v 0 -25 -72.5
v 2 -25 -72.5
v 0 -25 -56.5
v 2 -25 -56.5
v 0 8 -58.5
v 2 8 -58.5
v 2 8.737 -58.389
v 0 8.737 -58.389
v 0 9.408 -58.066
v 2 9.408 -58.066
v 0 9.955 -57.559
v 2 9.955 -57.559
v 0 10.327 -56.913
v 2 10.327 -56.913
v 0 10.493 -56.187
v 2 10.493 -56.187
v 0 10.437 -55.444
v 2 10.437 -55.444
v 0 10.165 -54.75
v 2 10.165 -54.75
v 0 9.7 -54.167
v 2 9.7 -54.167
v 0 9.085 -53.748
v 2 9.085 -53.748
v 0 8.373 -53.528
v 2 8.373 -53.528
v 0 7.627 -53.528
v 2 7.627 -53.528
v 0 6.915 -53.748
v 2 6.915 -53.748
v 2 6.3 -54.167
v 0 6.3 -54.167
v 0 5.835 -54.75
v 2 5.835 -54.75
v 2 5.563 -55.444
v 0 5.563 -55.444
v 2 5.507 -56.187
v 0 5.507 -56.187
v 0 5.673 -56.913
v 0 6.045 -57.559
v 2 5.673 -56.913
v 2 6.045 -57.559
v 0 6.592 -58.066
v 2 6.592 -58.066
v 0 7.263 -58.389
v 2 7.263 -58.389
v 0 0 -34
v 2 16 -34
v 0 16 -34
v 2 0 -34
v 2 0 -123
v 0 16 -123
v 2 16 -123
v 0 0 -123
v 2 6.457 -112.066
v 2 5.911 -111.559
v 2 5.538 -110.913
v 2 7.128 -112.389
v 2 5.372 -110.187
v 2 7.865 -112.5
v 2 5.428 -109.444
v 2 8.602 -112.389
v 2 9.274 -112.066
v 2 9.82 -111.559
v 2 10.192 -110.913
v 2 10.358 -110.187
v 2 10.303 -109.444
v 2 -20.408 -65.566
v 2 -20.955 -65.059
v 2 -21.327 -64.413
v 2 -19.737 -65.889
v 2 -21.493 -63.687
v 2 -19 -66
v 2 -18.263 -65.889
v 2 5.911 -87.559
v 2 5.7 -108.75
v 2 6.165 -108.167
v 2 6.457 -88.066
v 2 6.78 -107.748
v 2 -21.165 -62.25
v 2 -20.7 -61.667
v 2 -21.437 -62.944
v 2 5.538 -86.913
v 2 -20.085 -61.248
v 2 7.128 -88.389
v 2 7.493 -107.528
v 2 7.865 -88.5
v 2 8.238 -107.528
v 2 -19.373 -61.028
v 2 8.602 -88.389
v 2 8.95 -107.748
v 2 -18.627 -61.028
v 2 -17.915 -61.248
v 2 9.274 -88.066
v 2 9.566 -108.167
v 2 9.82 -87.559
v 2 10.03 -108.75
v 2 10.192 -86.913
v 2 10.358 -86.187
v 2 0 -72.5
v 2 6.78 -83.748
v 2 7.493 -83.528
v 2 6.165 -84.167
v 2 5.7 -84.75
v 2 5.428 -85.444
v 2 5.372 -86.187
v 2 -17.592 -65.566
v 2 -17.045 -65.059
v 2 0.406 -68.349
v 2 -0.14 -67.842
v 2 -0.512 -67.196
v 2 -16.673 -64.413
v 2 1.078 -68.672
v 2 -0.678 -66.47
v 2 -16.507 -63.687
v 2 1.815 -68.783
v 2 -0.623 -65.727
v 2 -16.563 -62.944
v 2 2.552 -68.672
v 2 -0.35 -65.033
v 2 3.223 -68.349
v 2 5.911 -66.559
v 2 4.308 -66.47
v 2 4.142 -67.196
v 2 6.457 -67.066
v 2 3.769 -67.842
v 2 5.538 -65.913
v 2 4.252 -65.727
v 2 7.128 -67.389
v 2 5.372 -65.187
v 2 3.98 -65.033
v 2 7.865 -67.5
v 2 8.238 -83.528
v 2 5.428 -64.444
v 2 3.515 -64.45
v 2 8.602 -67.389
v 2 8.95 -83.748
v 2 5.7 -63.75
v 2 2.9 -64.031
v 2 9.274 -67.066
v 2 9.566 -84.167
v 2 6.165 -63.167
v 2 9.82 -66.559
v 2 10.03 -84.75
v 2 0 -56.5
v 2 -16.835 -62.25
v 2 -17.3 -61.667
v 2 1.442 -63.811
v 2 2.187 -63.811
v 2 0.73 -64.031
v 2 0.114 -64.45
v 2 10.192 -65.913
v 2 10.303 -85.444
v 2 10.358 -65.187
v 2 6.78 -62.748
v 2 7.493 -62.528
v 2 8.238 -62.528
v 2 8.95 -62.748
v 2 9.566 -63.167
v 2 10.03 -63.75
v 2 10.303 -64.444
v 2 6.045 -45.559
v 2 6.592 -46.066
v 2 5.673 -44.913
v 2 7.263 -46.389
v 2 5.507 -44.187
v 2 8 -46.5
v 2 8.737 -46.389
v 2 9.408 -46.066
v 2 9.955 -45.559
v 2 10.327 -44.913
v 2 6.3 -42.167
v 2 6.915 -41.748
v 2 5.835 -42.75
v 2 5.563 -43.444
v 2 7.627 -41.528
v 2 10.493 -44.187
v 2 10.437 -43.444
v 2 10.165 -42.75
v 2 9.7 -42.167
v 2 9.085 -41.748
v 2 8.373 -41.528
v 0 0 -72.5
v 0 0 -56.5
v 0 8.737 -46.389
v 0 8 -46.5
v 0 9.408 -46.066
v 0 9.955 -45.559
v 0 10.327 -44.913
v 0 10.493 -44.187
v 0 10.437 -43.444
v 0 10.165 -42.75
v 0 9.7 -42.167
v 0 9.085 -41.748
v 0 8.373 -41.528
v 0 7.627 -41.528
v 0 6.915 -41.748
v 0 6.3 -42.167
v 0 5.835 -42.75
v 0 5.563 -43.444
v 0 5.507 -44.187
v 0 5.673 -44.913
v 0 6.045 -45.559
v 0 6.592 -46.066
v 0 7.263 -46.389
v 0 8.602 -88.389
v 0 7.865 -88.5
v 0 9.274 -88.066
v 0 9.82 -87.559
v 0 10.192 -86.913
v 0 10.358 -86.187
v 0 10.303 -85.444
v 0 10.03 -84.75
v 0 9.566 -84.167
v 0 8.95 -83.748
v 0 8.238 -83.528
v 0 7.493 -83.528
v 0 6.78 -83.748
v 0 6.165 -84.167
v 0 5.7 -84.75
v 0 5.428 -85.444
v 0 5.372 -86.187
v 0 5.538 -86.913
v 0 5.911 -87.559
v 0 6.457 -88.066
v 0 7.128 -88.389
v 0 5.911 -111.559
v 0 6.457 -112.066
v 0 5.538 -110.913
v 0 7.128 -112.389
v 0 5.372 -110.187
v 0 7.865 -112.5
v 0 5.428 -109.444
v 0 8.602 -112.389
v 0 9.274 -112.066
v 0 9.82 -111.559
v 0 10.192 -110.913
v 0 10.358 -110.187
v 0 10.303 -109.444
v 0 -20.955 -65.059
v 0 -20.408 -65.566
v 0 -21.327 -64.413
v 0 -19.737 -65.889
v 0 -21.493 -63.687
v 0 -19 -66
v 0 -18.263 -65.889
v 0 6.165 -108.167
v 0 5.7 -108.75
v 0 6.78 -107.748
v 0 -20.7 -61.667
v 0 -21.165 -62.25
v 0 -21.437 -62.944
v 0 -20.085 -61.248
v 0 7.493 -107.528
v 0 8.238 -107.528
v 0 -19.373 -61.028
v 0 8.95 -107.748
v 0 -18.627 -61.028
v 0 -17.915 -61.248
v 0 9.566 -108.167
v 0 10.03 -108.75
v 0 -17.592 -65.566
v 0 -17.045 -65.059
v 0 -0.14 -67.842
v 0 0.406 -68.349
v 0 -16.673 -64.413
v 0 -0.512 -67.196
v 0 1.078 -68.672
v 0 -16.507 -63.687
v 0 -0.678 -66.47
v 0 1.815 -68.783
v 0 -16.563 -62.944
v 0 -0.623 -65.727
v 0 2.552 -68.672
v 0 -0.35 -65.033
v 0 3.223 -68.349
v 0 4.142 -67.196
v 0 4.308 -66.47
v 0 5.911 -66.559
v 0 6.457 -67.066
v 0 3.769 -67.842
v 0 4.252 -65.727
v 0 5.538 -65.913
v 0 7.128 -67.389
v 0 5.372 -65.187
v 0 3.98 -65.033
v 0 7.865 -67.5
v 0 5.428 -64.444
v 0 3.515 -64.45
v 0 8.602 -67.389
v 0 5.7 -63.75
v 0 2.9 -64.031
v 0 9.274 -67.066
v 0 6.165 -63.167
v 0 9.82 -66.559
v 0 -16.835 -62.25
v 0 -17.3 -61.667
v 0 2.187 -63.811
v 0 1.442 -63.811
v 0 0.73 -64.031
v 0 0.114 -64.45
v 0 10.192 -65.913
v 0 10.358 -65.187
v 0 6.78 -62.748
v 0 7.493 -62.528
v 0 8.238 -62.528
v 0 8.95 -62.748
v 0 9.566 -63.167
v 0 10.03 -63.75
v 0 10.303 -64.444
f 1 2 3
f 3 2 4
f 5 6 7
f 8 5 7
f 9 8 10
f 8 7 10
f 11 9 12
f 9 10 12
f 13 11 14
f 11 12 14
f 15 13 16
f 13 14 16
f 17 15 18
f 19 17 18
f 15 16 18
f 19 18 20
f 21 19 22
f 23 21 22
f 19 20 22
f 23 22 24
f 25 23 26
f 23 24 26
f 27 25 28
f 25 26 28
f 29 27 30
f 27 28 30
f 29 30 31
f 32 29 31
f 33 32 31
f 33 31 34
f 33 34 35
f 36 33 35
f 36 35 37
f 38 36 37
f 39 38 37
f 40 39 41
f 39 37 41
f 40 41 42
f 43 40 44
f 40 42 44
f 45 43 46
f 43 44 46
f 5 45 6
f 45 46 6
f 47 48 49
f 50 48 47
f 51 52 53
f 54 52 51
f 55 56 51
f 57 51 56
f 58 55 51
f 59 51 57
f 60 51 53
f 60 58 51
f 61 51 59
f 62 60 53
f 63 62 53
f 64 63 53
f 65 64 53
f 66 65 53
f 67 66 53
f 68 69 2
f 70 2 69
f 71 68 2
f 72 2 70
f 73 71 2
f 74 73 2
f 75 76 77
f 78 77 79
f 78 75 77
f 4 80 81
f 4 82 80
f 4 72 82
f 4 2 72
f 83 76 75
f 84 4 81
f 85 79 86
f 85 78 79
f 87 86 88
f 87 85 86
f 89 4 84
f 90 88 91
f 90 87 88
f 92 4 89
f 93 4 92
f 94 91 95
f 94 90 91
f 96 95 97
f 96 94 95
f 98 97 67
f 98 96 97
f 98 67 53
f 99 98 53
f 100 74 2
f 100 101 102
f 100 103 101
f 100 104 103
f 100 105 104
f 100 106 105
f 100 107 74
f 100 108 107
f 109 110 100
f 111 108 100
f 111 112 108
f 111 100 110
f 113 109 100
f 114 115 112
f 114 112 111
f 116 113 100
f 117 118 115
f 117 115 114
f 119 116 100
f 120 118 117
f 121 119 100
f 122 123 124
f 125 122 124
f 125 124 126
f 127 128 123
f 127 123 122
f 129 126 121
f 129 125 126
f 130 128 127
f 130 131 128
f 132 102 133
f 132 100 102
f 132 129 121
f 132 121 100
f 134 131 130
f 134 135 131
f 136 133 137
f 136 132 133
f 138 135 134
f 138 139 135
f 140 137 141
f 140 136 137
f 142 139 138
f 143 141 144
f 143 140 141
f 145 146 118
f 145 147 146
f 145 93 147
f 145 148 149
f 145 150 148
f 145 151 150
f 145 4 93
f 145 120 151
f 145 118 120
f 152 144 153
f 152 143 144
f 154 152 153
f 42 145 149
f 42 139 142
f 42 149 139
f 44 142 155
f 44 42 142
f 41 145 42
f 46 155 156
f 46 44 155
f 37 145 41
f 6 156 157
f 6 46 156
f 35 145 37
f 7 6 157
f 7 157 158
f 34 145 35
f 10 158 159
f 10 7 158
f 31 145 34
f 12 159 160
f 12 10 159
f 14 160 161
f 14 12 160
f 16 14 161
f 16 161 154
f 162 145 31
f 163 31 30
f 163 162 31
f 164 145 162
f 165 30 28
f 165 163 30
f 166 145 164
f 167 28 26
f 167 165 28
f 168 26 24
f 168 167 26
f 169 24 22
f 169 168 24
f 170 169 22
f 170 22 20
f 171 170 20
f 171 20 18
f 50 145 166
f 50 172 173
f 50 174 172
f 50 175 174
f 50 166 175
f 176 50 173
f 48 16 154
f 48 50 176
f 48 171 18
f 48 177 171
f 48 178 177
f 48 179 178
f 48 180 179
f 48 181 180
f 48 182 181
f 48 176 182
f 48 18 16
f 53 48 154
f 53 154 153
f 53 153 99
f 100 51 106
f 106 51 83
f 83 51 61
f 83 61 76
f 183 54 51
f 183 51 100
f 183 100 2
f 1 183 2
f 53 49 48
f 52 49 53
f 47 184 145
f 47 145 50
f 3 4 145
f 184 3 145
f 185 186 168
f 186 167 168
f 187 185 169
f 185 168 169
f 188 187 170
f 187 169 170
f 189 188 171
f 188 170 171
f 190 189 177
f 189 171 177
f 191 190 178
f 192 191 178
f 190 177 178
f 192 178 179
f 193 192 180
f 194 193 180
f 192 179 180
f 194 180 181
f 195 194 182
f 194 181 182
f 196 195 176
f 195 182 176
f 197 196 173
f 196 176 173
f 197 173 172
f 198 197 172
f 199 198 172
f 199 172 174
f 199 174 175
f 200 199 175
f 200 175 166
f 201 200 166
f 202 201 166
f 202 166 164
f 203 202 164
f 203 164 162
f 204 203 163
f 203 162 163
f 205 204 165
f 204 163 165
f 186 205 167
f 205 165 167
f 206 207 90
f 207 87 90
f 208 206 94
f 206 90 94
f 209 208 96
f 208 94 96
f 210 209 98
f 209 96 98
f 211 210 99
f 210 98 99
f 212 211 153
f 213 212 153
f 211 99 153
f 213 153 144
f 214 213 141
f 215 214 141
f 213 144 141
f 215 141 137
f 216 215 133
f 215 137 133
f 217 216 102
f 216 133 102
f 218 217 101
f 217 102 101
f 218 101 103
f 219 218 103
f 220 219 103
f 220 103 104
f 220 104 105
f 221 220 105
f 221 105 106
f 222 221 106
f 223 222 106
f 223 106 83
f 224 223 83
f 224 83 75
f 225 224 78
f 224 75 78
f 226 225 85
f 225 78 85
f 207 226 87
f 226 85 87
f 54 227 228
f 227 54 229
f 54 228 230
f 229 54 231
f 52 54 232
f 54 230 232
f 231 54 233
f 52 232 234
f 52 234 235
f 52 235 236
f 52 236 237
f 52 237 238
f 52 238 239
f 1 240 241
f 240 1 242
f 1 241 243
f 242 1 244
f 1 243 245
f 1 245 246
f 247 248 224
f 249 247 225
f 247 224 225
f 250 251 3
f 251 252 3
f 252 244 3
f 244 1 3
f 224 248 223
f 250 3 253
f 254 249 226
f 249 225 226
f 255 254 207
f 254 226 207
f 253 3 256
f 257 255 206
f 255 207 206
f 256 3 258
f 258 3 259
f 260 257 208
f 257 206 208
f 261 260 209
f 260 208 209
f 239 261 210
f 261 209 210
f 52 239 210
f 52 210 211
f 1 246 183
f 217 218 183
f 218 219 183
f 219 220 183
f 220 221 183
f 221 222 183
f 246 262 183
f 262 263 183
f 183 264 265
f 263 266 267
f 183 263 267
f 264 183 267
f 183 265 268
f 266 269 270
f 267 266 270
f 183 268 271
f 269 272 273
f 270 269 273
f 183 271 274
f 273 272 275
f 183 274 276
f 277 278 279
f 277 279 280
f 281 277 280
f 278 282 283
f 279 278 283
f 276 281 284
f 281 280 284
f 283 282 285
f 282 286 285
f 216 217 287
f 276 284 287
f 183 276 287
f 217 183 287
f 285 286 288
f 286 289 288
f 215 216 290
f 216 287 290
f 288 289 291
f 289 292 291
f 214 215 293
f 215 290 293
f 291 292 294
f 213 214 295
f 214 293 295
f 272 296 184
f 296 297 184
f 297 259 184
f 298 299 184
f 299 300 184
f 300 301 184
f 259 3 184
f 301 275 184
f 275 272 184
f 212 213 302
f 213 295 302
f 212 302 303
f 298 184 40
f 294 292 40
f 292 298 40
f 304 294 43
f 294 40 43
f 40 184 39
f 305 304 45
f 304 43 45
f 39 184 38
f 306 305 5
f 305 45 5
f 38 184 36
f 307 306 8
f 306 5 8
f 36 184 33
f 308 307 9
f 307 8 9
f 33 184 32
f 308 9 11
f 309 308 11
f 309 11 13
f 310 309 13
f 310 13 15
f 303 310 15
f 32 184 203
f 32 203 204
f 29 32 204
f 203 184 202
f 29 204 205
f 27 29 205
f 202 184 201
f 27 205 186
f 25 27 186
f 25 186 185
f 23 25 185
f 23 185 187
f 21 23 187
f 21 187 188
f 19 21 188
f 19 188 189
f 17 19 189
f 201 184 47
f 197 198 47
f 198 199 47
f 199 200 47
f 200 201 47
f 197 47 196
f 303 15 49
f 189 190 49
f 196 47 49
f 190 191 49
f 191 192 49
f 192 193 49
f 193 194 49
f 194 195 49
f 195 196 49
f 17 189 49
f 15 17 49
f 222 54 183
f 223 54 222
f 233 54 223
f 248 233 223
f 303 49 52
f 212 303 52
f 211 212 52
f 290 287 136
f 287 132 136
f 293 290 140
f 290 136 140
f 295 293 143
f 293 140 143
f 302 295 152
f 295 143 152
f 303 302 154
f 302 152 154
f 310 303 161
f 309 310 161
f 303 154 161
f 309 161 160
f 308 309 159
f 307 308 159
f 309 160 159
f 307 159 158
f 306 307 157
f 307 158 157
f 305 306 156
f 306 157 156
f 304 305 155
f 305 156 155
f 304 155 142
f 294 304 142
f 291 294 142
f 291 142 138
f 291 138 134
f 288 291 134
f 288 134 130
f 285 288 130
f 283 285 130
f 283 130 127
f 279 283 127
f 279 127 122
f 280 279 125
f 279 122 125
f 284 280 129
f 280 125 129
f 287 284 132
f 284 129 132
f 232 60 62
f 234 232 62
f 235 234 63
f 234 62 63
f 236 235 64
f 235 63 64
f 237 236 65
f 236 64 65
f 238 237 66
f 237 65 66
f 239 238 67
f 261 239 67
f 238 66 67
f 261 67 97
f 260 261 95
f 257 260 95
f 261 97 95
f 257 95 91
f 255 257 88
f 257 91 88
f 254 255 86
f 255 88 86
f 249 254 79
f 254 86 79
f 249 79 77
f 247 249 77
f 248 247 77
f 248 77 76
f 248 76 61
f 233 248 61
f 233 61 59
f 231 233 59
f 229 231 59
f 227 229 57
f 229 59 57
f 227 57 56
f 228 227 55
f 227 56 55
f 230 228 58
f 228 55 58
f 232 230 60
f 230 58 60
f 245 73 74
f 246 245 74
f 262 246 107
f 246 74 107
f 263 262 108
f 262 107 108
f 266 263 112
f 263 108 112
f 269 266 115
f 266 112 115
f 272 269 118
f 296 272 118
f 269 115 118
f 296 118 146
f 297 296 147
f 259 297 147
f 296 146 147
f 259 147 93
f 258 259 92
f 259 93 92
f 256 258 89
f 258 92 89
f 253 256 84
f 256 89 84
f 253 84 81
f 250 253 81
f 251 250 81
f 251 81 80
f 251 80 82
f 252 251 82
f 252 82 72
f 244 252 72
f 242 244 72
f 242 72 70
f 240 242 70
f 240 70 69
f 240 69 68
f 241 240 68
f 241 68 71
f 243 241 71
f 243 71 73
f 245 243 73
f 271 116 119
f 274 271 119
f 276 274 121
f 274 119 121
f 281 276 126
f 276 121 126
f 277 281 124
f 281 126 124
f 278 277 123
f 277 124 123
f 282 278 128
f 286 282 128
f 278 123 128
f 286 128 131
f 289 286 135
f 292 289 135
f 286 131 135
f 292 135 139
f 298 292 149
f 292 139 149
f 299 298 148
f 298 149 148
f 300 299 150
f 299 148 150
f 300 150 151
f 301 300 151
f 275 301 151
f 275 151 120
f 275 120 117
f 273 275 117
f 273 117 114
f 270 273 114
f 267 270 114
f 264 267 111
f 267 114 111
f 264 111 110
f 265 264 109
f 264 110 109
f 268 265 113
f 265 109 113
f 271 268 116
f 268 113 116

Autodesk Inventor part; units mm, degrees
ref_plane "YZ Plane" through (0, 0, 0) normal (1, 0, 0) x (0, 1, 0)
ref_plane "XZ Plane" through (0, 0, 0) normal (0, 1, 0) x (-1, 0, 0)
ref_plane "XY Plane" through (0, 0, 0) normal (0, 0, 1) x (1, 0, 0)
sketch "Sketch1" plane through (0, 0, 0) normal (1, 0, 0) x (0, 1, 0)
  line L0 (0, 0) -> (16, 0)
  line L1 (16, 0) -> (16, -100)
  line L2 (16, -100) -> (0, -100)
  line L3 (0, -10) -> (0, -10)
  line L4 (0, -10) -> (0, -25)
  line L5 (0, -25) -> (0, -25)
  line L6 (0, -90) -> (0, -90)
  line L7 (0, -90) -> (0, -75)
  line L8 (0, -75) -> (0, -75)
  line L9 (0, -10) -> (0, 0)
  line L10 (0, -100) -> (0, -90)
  line L11 (0, -75) -> (0, -25)
  dimension "d0" = 16
  dimension "d1" = 100
  dimension "d2" = 0
  dimension "d3" = 15
  dimension "d4" = 10
  dimension "d5" = 15
  dimension "d6" = 10
  dimension "d10" = 0
  dimension "d11" = 0
  dimension "d12" = 0
extrude "Extrusion1" add sketch "Sketch1" along normal blind 2
sketch "Sketch5" plane through (2, 0, 0) normal (1, 0, 0) x (0, 0, -1)
  line L0 (0, 0) -> (100, 0) projected
  circle A0 centre (63.5, -19) radius 2.5 projected
  line L1 (56.5, 0) -> (72.5, 0)
  line L2 (72.5, 0) -> (72.5, -25)
  line L3 (72.5, -25) -> (56.5, -25)
  line L4 (56.5, -25) -> (56.5, 0)
  circle A1 centre (66.2831, 1.8148) radius 2.5
  circle A2 centre (56, 8) radius 6 construction
  circle A3 centre (63.5, -19) radius 15 construction
  circle A4 centre (66.2831, 1.8148) radius 6 construction
  dimension "d44" = 16
  dimension "d45" = 25
  dimension "d46" = 9
  dimension "d52" = 5
  dimension "d56" = 12
  dimension "d57" = 30
  dimension "d58" = 12
extrude "Extrusion6" add sketch "Sketch5" against normal blind 2 contours L0 A1 L2 L3 L4 | L0 A1 picked at (65.8534, -0.1091)
sketch "Sketch7" plane through (2, 0, 0) normal (1, 0, 0) x (0, 0, -1)
  circle A0 centre (44, 8) radius 2.5 projected
  circle A1 centre (56, 8) radius 2.5 projected
  circle A2 centre (66.2831, 1.8148) radius 2.5 projected
  circle A3 centre (63.5, -19) radius 2.5 projected
  circle A4 centre (44, 8) radius 2.5
  circle A5 centre (56, 8) radius 2.5
  circle A6 centre (66.2831, 1.8148) radius 2.5
  circle A7 centre (63.5, -19) radius 2.5 projected
  circle A8 centre (63.5, -19) radius 2.5
  point P0 (0, 0)
  dimension "d59" = 5
  dimension "d60" = 5
  dimension "d61" = 5
  dimension "d62" = 5
extrude "Extrusion8" cut sketch "Sketch7" against normal blind 10 contours A0 | A1 | A2
sketch "Sketch8" plane through (2, 0, 0) normal (1, 0, 0) x (0, 0, -1)
  circle A0 centre (44, 8) radius 2.5 projected
  line L0 (0, 0) -> (56.5, 0) projected
  line L1 (0, 16) -> (0, 0) projected
  line L2 (100, 16) -> (0, 16) projected
  line L3 (56.5, 0) -> (0, 0) projected
  line L4 (34, 0) -> (0, 0)
  line L5 (0, 0) -> (0, 16)
  line L6 (0, 16) -> (34, 16)
  line L7 (34, 16) -> (34, 0)
  dimension "d65" = 10
extrude "Extrusion9" cut sketch "Sketch8" against normal blind 10 contours L1 L2 L7 L0
sketch "Sketch9" plane through (2, 0, 0) normal (1, 0, 0) x (0, 0, -1)
  circle A0 centre (56, 8) radius 2.5 projected
  circle A1 centre (66.2831, 1.8148) radius 2.5 projected
  circle A2 centre (65, 7.8652) radius 2.5
  circle A3 centre (86, 7.8652) radius 2.5
  circle A4 centre (44, 8) radius 2.5 projected
  point P0 (0, 0)
  dimension "d68" = 5
  dimension "d71" = 5
  dimension "d72" = 21
  dimension "d76" = 21
  dimension "d77" = 6.0505
  dimension "d78" = 6.0505
extrude "Extrusion10" cut sketch "Sketch9" against normal blind 10 contours A2 | A3
sketch "Sketch10" plane through (0, 0, 0) normal (-1, 0, 0) x (0, 0, 1)
  line L0 (-123.9658, 20.3206) -> (-103.1897, 17.2622) projected
  line L1 (-124.0249, -0.6793) -> (-123.9658, 20.3206) projected
  line L2 (-102.025, -0.7412) -> (-124.0249, -0.6793) projected
  line L3 (-102.025, -0.7412) -> (-101.9743, 17.2588) projected
  line L4 (-103.1897, 17.2622) -> (-101.9743, 17.2588) projected
  circle A0 centre (-65, 7.8652) radius 2.5 projected
  circle A1 centre (-86, 7.8652) radius 2.5 projected
  line L5 (-34, 0) -> (-34, 16) projected
  line L6 (-34, 16) -> (-100, 16) projected
  line L7 (-100, 16) -> (-100, 0) projected
  line L8 (-100, 0) -> (-72.5, 0) projected
  line L9 (-72.5, 0) -> (-72.5, -25) projected
  line L10 (-72.5, -25) -> (-56.5, -25) projected
  line L11 (-56.5, -25) -> (-56.5, 0) projected
  line L12 (-56.5, 0) -> (-34, 0) projected
  circle A2 centre (-63.5, -19) radius 2.5 projected
  circle A3 centre (-66.2831, 1.8148) radius 2.5 projected
  circle A4 centre (-44, 8) radius 2.5 projected
  circle A5 centre (-56, 8) radius 2.5 projected
  line L13 (-100, 16) -> (-123, 16)
  line L14 (-123, 16) -> (-123, 0)
  line L15 (-123, 0) -> (-100, 0)
  line L16 (-100, 0) -> (-100, 16)
  point P0 (0, 0)
  dimension "d79" = 23
extrude "Extrusion11" add sketch "Sketch10" against normal blind 2 contours L13 L7 L15 L3 | L3 L15 L14 L13
sketch "Sketch11" plane through (2, 0, 0) normal (1, 0, 0) x (0, 0, -1)
  circle A0 centre (110, 7.8652) radius 2.5 projected
  circle A1 centre (110, 7.8652) radius 2.5
  point P0 (0, 0)
  dimension "d82" = 5
extrude "Extrusion12" cut sketch "Sketch11" against normal blind 10
equation "\"d78\" = d77"
properties part number "Mounting_wall_3"
